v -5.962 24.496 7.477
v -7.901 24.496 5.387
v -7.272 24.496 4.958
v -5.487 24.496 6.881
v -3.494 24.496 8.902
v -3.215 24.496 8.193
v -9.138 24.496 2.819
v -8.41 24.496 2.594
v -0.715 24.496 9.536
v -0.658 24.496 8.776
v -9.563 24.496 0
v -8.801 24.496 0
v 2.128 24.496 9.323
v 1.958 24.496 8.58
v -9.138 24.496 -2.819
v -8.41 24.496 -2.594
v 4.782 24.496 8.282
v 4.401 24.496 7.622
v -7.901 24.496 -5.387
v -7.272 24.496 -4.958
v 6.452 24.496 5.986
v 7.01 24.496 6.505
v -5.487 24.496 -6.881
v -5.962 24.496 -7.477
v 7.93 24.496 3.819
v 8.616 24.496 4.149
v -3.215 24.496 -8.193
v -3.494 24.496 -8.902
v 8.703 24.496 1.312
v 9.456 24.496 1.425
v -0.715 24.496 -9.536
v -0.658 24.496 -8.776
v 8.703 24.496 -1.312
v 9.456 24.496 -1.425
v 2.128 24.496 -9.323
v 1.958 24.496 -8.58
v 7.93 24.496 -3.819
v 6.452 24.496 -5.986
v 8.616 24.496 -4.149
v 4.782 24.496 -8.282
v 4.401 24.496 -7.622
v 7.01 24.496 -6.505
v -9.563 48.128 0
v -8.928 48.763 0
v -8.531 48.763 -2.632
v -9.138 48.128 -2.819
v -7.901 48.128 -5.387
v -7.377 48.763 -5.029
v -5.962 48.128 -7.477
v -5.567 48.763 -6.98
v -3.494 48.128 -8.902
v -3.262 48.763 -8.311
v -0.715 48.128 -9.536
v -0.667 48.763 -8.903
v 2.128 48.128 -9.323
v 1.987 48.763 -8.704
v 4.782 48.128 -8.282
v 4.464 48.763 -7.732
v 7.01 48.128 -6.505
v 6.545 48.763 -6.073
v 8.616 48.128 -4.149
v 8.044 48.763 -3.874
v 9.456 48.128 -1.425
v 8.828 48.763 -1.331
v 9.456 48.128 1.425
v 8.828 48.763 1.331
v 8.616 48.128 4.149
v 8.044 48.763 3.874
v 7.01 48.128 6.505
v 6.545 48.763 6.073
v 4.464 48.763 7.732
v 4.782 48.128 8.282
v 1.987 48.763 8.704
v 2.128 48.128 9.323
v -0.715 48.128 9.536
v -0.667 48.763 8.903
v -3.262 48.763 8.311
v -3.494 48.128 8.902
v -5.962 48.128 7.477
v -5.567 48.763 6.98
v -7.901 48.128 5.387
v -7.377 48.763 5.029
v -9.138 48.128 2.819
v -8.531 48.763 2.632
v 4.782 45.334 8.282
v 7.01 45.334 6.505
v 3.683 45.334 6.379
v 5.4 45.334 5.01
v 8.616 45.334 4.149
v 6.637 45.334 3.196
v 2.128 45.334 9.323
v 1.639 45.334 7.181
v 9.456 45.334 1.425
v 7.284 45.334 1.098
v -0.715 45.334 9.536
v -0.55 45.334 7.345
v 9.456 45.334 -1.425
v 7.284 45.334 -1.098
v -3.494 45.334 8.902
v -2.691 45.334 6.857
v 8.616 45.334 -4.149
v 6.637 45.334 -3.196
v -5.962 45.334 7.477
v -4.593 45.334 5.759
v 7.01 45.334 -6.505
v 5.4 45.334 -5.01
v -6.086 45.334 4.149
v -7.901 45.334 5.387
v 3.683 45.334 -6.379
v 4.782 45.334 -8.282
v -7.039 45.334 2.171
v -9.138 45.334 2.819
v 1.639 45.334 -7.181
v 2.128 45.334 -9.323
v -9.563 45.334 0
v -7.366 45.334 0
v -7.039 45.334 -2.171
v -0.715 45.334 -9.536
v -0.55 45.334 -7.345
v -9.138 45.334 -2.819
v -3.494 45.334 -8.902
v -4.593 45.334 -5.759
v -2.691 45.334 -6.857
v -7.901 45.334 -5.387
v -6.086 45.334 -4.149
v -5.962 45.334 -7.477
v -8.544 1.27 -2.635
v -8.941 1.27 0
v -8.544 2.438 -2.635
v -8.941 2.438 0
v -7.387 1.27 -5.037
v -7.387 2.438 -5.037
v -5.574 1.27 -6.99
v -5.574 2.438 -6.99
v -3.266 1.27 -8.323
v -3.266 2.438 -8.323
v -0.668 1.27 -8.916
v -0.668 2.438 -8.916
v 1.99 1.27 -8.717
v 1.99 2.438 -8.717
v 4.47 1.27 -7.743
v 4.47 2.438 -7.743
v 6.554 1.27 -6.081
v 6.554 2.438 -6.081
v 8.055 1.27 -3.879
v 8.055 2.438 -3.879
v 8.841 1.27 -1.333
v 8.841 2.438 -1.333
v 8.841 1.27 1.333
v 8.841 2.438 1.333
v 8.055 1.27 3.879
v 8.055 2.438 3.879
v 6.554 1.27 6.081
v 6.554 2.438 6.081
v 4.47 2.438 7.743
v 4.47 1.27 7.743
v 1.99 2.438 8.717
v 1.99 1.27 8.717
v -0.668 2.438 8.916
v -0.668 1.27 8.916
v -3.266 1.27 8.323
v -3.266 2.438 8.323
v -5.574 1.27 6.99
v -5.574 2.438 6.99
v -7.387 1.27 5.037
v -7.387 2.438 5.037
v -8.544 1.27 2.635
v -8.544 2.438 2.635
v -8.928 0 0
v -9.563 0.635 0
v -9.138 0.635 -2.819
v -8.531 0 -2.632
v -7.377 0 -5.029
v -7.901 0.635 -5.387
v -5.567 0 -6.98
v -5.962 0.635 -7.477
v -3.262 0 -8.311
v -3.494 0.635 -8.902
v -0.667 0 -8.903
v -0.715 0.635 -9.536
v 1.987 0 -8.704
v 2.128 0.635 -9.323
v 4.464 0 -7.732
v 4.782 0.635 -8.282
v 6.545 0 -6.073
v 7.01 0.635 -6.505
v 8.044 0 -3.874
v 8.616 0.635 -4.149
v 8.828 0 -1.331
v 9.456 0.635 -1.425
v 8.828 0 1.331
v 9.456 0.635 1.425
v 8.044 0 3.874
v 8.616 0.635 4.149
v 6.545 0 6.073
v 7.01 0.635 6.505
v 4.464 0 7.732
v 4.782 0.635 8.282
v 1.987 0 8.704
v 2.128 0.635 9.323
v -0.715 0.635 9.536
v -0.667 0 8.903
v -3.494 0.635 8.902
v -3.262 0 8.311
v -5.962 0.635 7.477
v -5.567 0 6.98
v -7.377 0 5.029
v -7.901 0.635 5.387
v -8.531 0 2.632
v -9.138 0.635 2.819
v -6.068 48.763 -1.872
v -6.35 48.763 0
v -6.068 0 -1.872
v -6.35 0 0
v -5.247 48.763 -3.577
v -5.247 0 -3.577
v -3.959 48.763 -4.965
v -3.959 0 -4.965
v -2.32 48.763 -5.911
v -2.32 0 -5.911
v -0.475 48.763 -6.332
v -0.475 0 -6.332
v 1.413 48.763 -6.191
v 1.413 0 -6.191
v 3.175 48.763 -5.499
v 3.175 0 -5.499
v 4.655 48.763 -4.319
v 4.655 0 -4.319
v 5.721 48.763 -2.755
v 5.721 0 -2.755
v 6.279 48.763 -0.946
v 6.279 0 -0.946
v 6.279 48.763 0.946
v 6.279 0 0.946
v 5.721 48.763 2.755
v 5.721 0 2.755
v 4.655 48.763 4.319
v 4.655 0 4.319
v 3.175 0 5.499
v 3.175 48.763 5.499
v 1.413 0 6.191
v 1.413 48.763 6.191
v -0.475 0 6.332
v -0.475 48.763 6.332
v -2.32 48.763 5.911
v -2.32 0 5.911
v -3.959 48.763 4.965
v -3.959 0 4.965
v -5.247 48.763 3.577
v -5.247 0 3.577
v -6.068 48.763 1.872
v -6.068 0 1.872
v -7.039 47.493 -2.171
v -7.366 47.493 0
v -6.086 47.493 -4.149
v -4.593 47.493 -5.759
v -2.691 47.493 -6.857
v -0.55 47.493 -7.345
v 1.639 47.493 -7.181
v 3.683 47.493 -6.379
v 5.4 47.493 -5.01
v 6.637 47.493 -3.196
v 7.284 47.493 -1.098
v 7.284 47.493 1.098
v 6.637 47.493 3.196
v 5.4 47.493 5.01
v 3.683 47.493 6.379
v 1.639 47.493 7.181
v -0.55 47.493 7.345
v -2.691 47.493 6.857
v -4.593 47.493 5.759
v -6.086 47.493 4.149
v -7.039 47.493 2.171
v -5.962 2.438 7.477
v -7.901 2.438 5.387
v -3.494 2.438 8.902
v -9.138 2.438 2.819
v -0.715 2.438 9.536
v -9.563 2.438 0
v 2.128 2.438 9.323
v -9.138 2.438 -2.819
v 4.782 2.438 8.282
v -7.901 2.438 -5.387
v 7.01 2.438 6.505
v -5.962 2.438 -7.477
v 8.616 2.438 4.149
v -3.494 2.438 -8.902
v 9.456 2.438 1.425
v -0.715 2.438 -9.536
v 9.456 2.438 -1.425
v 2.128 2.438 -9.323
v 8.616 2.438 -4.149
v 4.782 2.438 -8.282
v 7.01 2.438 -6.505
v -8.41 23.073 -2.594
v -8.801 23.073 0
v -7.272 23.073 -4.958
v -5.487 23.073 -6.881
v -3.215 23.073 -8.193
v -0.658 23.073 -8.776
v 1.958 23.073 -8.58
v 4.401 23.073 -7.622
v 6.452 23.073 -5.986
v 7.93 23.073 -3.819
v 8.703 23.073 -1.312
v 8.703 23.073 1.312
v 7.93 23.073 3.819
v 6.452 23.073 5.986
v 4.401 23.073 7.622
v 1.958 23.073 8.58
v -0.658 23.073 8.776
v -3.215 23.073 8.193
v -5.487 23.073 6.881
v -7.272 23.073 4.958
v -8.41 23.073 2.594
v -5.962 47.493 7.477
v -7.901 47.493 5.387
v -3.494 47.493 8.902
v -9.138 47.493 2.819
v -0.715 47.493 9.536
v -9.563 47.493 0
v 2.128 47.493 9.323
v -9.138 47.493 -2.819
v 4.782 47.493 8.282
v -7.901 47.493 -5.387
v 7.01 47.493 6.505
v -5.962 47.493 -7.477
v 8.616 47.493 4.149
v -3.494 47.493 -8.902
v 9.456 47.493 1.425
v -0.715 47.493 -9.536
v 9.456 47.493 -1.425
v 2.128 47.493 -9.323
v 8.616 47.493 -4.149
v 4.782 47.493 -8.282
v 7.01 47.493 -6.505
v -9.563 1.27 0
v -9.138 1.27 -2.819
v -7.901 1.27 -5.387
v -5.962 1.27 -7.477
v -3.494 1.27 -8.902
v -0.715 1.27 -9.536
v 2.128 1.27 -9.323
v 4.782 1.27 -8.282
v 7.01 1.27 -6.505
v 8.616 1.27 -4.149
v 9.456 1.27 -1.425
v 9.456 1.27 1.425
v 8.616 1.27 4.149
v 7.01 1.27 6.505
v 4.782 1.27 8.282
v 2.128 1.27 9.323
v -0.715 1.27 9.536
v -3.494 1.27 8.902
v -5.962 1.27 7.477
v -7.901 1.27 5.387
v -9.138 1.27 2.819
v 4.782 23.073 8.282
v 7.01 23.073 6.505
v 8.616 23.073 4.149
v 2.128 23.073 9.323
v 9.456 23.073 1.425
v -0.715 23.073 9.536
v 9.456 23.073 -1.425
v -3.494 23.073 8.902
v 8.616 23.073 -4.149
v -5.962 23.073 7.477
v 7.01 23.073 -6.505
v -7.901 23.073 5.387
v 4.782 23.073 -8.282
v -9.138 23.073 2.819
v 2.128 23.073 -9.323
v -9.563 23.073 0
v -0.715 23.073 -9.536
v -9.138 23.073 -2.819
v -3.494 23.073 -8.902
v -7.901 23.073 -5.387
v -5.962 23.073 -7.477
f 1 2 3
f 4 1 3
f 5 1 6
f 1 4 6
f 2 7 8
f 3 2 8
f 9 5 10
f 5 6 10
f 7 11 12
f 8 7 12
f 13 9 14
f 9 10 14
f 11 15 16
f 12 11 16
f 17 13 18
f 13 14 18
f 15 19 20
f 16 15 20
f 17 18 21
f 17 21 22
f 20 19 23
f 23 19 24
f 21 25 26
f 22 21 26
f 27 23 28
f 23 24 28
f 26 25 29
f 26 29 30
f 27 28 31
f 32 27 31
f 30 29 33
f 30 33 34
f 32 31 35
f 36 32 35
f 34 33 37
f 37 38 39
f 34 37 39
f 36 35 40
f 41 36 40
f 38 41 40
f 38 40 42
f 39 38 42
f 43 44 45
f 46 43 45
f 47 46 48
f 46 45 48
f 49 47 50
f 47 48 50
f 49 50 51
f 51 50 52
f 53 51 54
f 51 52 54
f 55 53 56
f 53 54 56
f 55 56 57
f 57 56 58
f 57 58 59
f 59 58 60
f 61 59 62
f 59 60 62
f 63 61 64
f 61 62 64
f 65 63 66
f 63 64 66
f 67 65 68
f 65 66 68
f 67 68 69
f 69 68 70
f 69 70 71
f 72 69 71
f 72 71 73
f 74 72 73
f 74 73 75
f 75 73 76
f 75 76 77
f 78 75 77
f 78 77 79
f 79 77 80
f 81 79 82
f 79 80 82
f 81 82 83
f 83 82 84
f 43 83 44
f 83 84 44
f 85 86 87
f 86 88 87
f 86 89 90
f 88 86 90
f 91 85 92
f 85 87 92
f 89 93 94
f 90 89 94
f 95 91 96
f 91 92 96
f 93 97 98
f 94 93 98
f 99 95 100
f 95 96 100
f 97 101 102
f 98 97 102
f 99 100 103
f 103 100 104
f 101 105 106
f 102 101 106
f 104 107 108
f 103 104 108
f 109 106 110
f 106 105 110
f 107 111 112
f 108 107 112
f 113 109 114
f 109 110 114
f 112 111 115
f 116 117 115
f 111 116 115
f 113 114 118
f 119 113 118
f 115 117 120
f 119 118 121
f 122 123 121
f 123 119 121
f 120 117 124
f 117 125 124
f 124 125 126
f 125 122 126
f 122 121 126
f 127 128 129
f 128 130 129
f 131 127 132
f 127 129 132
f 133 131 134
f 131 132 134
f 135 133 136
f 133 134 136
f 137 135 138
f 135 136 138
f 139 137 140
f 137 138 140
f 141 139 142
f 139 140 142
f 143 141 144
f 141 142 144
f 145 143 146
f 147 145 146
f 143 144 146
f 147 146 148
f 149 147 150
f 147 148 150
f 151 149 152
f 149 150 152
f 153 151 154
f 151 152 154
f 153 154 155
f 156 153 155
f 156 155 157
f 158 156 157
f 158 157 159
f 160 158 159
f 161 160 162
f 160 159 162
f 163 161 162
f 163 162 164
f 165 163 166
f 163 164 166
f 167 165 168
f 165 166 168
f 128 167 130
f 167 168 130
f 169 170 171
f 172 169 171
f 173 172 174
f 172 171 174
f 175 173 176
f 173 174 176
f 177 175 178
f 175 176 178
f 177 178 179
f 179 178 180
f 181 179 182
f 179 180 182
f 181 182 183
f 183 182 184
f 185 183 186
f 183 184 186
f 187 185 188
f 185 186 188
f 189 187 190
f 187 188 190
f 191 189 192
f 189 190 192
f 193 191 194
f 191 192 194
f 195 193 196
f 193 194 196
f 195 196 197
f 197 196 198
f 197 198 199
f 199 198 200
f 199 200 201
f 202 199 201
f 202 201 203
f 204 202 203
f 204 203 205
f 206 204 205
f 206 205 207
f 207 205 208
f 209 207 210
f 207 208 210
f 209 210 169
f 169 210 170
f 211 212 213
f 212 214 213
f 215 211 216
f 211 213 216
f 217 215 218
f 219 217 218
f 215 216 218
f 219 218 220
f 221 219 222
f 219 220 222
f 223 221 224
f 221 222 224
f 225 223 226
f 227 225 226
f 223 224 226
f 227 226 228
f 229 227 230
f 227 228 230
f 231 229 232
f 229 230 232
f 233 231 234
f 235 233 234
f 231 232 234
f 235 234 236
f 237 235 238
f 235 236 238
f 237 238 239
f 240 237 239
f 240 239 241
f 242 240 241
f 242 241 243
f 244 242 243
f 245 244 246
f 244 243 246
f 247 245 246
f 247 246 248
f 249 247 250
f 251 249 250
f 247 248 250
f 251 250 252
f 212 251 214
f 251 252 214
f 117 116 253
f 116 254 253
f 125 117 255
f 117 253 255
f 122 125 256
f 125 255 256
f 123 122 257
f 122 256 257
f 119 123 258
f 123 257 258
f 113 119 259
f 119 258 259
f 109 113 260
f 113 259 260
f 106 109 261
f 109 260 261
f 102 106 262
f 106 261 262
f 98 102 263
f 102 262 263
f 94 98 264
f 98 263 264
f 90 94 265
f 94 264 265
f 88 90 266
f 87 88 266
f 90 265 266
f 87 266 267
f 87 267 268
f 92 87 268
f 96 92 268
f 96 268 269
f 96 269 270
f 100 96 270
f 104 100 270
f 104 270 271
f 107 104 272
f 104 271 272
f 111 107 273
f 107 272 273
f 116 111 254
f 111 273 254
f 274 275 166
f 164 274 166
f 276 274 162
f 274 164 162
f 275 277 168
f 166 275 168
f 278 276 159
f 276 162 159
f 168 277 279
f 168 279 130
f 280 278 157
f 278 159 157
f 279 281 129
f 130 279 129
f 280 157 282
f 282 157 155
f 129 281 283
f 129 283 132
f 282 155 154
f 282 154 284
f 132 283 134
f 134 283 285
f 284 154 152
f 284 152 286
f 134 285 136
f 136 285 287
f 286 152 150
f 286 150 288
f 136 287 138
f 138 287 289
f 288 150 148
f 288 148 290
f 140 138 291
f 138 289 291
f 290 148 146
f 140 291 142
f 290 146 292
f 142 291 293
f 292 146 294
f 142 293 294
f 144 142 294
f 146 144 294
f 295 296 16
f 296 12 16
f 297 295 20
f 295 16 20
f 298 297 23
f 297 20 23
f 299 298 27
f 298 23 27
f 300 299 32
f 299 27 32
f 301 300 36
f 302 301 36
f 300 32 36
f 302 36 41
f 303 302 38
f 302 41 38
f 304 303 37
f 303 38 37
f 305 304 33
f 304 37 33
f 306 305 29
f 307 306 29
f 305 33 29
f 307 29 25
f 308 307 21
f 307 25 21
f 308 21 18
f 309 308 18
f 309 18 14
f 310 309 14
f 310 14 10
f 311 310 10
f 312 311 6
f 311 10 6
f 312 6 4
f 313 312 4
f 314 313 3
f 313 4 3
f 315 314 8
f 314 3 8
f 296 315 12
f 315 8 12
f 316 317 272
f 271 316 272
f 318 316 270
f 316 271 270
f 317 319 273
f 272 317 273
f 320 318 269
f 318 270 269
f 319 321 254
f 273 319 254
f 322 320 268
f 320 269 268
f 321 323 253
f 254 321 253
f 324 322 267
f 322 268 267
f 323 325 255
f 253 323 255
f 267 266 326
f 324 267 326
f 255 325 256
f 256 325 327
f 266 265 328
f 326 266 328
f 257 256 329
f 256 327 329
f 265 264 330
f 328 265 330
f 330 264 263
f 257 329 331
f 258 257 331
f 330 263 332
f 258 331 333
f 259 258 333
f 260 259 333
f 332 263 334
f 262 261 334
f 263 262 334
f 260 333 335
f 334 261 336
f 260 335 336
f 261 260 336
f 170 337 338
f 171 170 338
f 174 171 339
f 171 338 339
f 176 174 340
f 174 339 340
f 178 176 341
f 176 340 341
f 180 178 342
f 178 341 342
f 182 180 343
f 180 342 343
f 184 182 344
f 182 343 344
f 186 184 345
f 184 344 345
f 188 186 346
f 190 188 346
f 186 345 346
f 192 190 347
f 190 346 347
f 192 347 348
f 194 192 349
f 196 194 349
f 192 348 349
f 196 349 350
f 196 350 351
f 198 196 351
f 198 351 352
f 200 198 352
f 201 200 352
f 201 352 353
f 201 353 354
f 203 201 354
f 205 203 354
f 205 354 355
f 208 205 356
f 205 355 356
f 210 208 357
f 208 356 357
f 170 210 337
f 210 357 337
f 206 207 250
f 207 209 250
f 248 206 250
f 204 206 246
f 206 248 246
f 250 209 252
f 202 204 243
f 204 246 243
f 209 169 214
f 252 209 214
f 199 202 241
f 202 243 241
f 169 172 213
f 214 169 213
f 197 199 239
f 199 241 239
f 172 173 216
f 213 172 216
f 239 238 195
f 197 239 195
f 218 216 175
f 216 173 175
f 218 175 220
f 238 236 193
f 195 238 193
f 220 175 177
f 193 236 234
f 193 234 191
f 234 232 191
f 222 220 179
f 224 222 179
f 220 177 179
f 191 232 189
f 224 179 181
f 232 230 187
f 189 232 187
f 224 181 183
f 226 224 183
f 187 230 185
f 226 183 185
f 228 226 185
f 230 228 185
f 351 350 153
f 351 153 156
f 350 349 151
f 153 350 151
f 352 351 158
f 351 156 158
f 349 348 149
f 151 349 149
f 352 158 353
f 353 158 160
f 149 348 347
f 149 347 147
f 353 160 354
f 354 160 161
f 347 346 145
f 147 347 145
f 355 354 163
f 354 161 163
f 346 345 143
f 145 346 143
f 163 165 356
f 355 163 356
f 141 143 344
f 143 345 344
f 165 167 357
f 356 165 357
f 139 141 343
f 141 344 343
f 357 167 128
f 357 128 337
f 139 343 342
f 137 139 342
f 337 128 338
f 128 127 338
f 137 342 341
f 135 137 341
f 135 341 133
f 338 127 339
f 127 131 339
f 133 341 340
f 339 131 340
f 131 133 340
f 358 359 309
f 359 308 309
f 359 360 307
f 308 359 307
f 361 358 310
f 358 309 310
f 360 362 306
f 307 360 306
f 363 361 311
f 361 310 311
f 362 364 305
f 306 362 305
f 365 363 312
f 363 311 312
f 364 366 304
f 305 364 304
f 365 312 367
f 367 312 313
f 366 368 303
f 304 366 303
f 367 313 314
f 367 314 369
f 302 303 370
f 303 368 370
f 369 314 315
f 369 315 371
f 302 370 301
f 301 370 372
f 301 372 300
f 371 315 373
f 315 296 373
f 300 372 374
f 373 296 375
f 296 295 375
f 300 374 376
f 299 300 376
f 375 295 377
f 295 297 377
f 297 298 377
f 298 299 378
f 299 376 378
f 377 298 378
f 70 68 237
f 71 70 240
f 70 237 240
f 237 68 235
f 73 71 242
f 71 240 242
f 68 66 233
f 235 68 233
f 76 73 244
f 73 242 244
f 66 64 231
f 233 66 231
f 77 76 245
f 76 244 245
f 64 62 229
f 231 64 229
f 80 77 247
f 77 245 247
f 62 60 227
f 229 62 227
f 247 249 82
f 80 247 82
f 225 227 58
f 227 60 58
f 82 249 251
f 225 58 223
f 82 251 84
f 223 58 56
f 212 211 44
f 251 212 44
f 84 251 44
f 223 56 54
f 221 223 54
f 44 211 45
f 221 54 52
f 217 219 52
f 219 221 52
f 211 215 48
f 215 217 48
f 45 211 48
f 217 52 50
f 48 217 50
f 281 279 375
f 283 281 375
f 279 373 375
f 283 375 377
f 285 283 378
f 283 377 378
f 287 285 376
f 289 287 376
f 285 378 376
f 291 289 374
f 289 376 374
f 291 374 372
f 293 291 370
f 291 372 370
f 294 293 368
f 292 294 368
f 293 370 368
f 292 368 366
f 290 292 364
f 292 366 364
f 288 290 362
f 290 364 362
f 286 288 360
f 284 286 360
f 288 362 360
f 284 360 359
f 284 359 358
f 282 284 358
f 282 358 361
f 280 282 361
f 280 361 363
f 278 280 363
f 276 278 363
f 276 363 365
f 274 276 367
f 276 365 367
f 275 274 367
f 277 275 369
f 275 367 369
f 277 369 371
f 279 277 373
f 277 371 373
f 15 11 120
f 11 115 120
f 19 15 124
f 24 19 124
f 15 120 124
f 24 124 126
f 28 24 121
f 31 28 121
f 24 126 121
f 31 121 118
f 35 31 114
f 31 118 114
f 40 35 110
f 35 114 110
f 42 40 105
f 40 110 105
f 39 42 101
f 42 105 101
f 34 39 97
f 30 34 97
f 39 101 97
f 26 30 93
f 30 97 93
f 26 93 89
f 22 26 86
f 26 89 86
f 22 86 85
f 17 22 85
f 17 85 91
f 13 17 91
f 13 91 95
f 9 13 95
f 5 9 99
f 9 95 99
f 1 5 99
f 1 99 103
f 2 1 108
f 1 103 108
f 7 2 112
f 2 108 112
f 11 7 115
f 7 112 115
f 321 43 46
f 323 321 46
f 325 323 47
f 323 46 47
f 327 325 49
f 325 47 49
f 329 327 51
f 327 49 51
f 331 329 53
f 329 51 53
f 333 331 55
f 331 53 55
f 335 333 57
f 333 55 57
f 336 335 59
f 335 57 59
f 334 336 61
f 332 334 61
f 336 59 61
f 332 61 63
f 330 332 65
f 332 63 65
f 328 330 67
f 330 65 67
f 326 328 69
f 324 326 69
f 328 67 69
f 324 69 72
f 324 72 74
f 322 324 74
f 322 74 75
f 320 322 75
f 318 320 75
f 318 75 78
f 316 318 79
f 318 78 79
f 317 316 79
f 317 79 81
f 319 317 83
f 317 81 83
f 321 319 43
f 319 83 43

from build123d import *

# Parameters (mm, degrees)
CHAMFER1_SIZE = 0.635


with BuildPart() as part:
    # Sketch1 → Revolve1 (revolve)
    with BuildSketch(Plane.XY):
        Polygon((-9.5631, 24.49576), (-9.5631, 45.33392), (-7.366, 45.33392), (-7.366, 47.49292), (-9.5631, 47.49292), (-9.5631, 48.76292), (-6.35, 48.76292), (-6.35, 0), (-9.5631, 0), (-9.5631, 1.27), (-8.9408, 1.27), (-8.9408, 2.4384), (-9.5631, 2.4384), (-9.5631, 23.07336), (-8.8011, 23.07336), (-8.8011, 24.49576), align=None)
    revolve(axis=Axis((0, 55, 0), (0, -1, 0)))

    # Chamfer1
    chamfer1_edges = [part.edges().sort_by_distance(p)[0] for p in [
        (9.5631, 0, 0),
        (9.5631, 48.76292, 0),
    ]]
    chamfer(chamfer1_edges, length=CHAMFER1_SIZE)


solid = part.part
